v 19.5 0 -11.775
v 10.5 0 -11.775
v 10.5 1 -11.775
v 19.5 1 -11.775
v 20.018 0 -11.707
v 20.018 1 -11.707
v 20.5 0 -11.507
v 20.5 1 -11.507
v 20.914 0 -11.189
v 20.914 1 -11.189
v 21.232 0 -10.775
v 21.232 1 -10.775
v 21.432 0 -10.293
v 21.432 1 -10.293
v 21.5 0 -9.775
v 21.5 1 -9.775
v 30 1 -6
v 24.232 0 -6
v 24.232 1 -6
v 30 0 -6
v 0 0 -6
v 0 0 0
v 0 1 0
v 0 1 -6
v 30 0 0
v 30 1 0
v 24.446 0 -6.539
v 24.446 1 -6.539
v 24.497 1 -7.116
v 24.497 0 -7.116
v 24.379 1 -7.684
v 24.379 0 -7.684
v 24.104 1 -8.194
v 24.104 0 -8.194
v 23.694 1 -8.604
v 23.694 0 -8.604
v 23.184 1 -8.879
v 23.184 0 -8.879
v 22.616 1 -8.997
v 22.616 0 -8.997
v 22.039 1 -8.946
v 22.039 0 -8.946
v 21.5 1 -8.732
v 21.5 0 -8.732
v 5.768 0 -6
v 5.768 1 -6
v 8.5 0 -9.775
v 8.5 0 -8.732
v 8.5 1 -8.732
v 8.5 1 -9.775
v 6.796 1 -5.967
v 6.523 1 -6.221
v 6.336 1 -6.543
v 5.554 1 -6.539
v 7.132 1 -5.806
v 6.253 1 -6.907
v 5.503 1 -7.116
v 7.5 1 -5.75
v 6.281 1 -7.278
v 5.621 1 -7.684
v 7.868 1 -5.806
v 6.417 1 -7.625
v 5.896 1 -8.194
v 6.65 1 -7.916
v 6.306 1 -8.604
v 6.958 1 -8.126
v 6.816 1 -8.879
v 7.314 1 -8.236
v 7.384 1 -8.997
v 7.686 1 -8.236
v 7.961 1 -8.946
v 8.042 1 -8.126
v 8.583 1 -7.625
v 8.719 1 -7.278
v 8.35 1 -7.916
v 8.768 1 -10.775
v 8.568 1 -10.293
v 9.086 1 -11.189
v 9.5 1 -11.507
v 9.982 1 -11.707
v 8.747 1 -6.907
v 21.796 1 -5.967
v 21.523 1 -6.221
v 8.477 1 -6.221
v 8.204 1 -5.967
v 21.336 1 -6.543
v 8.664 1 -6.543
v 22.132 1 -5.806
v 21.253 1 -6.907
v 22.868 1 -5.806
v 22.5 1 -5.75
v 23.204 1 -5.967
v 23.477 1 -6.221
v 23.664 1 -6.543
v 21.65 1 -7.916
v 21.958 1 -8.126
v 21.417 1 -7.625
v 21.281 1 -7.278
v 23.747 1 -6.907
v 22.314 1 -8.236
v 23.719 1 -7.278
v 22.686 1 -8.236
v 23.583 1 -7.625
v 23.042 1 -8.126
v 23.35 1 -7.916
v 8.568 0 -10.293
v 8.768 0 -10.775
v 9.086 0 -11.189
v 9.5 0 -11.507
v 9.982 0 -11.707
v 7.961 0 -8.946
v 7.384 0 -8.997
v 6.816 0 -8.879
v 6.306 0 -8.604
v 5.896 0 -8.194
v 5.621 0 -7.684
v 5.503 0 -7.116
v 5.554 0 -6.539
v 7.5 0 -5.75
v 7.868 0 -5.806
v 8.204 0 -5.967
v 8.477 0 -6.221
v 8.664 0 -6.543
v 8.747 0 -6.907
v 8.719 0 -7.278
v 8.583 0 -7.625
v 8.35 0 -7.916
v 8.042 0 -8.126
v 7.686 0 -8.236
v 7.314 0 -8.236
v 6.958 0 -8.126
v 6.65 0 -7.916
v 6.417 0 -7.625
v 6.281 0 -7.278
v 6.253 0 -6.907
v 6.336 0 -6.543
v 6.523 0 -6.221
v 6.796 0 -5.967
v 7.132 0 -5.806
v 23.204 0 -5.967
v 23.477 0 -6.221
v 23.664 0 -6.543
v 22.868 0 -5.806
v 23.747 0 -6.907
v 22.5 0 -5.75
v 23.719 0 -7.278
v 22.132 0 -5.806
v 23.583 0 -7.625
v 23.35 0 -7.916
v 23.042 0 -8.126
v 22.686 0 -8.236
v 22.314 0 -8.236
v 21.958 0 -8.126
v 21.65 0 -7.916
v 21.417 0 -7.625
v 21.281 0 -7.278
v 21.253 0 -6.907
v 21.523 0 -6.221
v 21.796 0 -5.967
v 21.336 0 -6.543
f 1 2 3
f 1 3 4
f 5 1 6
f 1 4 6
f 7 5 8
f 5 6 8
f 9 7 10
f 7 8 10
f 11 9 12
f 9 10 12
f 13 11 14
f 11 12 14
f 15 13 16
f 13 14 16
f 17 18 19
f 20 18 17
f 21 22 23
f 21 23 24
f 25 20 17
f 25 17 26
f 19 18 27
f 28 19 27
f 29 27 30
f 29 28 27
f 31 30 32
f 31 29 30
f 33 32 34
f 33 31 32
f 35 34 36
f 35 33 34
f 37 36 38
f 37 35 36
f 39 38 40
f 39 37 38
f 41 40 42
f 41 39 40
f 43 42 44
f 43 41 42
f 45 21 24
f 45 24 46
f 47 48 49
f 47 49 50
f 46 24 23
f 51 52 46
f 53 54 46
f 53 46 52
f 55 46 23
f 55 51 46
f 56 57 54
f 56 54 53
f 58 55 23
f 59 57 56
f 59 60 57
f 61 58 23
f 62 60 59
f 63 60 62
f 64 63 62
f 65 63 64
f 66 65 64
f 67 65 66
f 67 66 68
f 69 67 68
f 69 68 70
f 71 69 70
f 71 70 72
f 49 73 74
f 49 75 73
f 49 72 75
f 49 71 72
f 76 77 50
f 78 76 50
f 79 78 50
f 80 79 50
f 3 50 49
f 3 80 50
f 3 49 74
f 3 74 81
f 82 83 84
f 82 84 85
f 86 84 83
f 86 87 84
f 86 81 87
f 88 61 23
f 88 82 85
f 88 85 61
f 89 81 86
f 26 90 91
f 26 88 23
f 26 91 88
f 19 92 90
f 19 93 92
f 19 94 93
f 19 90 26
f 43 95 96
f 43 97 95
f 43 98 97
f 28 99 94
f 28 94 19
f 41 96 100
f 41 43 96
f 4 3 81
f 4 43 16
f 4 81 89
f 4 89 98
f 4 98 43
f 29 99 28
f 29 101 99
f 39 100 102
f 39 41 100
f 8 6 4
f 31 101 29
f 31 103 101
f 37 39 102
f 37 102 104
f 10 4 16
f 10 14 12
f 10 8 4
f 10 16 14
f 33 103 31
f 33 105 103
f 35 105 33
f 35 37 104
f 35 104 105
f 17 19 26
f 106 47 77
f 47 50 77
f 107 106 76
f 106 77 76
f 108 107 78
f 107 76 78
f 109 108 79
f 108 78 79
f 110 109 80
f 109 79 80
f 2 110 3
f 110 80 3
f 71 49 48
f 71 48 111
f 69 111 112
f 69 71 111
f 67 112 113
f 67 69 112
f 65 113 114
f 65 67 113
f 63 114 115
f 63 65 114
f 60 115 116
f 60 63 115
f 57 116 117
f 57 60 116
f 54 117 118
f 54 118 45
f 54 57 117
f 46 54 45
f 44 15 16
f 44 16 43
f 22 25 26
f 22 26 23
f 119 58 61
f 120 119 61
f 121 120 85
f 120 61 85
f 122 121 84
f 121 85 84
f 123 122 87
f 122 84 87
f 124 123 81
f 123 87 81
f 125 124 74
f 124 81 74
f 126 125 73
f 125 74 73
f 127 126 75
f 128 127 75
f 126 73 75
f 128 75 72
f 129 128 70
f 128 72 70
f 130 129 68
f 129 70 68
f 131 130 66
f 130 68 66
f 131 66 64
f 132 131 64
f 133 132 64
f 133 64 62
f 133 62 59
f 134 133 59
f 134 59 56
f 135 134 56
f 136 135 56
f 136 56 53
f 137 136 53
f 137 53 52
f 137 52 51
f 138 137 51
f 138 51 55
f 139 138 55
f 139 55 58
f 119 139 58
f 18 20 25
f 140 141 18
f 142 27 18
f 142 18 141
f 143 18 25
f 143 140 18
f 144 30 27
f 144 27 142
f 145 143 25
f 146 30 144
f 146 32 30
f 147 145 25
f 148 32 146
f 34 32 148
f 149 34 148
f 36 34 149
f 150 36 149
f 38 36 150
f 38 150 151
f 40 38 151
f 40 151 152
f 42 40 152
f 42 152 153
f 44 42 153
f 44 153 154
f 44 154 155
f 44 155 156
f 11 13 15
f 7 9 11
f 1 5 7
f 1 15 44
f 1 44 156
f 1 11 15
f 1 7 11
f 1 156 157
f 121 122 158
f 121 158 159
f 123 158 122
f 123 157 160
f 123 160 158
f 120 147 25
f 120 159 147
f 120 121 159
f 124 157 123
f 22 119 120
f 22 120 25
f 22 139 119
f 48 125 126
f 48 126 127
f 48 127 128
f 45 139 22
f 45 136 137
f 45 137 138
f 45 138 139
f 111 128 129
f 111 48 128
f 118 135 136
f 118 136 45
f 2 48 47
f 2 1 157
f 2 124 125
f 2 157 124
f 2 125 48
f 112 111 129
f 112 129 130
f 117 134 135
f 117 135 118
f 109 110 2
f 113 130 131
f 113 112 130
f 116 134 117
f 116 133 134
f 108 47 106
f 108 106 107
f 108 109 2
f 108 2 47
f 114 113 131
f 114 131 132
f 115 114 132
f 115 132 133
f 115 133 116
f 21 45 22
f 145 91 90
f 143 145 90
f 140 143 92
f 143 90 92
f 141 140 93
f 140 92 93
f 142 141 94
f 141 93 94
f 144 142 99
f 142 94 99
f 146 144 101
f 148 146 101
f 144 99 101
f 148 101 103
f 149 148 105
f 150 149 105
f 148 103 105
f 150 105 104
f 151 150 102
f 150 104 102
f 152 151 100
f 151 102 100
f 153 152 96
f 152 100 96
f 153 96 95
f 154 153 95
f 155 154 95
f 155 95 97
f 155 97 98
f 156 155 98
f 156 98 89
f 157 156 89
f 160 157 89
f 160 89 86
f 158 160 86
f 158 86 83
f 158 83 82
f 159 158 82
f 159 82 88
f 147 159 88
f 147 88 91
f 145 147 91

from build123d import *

# Parameters (mm, degrees)
BOSS_EXTRU_1_DEPTH      = 1
ESQUISSE2_R             = 2
BOSS_EXTRU_2_DEPTH      = 1
ESQUISSE3_R             = 1.25
ENL_V_MAT_EXTRU_1_DEPTH = 33.243620766
CONG_1_R                = 2


with BuildPart() as part:
    # Esquisse1 → Boss.-Extru.1 (new body)
    with BuildSketch(Plane(origin=(0, 0, 0), x_dir=(1, 0, 0), z_dir=(0, 1, 0))):
        Polygon((21.5, 6), (30, 6), (30, 0), (0, 0), (0, 6), (8.5, 6), (8.5, 11.775019325), (21.5, 11.775019325), align=None)
    extrude(amount=BOSS_EXTRU_1_DEPTH)

    # Esquisse2 → Boss.-Extru.2 (add)
    with BuildSketch(Plane(origin=(0, 1, 0), x_dir=(1, 0, 0), z_dir=(0, 1, 0))):
        with Locations((7.5, 7)):
            Circle(ESQUISSE2_R)
        with Locations((22.5, 7)):
            Circle(ESQUISSE2_R)
    extrude(amount=-BOSS_EXTRU_2_DEPTH)

    # Esquisse3 → Enlèv. mat.-Extru.1 (cut, through all)
    with BuildSketch(Plane(origin=(0, 1, 0), x_dir=(1, 0, 0), z_dir=(0, 1, 0))):
        with Locations(Location((7.5, 7, 0), (0, 0, 270))):
            Circle(ESQUISSE3_R)
        with Locations(Location((22.5, 7, 0), (0, 0, 270))):
            Circle(ESQUISSE3_R)
    extrude(amount=-ENL_V_MAT_EXTRU_1_DEPTH, mode=Mode.SUBTRACT)

    # Congé1
    cong_1_edges = [part.edges().sort_by_distance(p)[0] for p in [
        (8.5, 0.5, -11.775019325),
        (21.5, 0.5, -11.775019325),
    ]]
    fillet(cong_1_edges, radius=CONG_1_R)


solid = part.part
